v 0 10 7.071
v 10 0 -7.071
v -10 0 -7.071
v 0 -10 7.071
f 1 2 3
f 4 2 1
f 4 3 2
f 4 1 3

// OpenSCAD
module tetrahedron()
{
	polyhedron(
		points=[
			[+1,0,-1/sqrt(2)],
			[-1,0,-1/sqrt(2)],
			[0,+1,+1/sqrt(2)],
			[0,-1,+1/sqrt(2)]
		],
		faces=[
			[1,0,2],
			[2,0,3],
			[0,1,3],
			[1,2,3]
		]
	);
}

scale(10) tetrahedron();
